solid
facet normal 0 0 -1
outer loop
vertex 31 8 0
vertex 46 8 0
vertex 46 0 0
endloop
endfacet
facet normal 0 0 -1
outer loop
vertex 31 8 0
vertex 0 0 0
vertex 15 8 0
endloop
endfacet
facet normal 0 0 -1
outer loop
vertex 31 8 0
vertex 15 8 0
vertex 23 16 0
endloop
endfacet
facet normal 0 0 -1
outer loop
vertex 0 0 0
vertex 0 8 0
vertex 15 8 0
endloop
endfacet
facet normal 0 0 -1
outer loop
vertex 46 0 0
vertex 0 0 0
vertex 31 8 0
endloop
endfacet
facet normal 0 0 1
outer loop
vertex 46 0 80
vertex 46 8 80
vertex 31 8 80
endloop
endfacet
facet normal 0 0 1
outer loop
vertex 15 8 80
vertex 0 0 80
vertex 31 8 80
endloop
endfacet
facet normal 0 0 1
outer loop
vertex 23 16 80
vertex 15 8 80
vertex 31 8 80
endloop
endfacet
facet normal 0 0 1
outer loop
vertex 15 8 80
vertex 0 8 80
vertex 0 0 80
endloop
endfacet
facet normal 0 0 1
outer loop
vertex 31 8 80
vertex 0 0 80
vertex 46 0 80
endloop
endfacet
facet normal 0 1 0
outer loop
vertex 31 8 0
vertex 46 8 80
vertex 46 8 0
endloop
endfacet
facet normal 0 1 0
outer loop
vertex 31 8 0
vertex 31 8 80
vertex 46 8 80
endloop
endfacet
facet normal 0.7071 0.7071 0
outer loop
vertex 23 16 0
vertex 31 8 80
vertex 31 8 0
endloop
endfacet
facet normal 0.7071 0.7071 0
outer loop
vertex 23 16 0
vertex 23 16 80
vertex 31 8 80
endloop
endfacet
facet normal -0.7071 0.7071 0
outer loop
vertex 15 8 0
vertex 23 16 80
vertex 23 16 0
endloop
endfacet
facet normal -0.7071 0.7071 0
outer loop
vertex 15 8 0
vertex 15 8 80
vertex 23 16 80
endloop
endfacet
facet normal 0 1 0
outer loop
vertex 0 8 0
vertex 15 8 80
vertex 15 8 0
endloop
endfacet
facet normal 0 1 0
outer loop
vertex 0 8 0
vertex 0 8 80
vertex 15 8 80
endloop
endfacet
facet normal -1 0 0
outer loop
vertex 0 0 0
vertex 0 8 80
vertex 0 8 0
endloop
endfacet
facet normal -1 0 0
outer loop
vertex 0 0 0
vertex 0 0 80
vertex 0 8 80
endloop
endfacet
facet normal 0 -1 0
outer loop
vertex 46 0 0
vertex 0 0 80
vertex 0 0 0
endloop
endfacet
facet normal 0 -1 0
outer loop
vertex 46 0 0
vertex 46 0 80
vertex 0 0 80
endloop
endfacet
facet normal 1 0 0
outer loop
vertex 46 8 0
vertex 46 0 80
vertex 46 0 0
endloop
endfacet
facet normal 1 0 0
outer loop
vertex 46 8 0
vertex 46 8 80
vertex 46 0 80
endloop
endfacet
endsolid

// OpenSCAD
$fn = 32;

// ----------------------------------------------------------------------
// V guide rail: vrib, 46 mm wide
// ----------------------------------------------------------------------

// --- parameters (mm) ---
rail_w = 46;              // rail width, X
base_t = 8;               // base plate thickness
v_depth = 8;              // V feature depth / height
v_half_w = 8;             // half width of the V at the base face
plate_t = 80;             // rail length, Z (the extrusion height)

profile = [[0, 0], [46, 0], [46, 8], [31, 8], [23, 16], [15, 8], [0, 8]];  // primary outline, 7 points, counter clockwise

// --- the one profile operation ---
linear_extrude(height = plate_t) polygon(points = profile);
